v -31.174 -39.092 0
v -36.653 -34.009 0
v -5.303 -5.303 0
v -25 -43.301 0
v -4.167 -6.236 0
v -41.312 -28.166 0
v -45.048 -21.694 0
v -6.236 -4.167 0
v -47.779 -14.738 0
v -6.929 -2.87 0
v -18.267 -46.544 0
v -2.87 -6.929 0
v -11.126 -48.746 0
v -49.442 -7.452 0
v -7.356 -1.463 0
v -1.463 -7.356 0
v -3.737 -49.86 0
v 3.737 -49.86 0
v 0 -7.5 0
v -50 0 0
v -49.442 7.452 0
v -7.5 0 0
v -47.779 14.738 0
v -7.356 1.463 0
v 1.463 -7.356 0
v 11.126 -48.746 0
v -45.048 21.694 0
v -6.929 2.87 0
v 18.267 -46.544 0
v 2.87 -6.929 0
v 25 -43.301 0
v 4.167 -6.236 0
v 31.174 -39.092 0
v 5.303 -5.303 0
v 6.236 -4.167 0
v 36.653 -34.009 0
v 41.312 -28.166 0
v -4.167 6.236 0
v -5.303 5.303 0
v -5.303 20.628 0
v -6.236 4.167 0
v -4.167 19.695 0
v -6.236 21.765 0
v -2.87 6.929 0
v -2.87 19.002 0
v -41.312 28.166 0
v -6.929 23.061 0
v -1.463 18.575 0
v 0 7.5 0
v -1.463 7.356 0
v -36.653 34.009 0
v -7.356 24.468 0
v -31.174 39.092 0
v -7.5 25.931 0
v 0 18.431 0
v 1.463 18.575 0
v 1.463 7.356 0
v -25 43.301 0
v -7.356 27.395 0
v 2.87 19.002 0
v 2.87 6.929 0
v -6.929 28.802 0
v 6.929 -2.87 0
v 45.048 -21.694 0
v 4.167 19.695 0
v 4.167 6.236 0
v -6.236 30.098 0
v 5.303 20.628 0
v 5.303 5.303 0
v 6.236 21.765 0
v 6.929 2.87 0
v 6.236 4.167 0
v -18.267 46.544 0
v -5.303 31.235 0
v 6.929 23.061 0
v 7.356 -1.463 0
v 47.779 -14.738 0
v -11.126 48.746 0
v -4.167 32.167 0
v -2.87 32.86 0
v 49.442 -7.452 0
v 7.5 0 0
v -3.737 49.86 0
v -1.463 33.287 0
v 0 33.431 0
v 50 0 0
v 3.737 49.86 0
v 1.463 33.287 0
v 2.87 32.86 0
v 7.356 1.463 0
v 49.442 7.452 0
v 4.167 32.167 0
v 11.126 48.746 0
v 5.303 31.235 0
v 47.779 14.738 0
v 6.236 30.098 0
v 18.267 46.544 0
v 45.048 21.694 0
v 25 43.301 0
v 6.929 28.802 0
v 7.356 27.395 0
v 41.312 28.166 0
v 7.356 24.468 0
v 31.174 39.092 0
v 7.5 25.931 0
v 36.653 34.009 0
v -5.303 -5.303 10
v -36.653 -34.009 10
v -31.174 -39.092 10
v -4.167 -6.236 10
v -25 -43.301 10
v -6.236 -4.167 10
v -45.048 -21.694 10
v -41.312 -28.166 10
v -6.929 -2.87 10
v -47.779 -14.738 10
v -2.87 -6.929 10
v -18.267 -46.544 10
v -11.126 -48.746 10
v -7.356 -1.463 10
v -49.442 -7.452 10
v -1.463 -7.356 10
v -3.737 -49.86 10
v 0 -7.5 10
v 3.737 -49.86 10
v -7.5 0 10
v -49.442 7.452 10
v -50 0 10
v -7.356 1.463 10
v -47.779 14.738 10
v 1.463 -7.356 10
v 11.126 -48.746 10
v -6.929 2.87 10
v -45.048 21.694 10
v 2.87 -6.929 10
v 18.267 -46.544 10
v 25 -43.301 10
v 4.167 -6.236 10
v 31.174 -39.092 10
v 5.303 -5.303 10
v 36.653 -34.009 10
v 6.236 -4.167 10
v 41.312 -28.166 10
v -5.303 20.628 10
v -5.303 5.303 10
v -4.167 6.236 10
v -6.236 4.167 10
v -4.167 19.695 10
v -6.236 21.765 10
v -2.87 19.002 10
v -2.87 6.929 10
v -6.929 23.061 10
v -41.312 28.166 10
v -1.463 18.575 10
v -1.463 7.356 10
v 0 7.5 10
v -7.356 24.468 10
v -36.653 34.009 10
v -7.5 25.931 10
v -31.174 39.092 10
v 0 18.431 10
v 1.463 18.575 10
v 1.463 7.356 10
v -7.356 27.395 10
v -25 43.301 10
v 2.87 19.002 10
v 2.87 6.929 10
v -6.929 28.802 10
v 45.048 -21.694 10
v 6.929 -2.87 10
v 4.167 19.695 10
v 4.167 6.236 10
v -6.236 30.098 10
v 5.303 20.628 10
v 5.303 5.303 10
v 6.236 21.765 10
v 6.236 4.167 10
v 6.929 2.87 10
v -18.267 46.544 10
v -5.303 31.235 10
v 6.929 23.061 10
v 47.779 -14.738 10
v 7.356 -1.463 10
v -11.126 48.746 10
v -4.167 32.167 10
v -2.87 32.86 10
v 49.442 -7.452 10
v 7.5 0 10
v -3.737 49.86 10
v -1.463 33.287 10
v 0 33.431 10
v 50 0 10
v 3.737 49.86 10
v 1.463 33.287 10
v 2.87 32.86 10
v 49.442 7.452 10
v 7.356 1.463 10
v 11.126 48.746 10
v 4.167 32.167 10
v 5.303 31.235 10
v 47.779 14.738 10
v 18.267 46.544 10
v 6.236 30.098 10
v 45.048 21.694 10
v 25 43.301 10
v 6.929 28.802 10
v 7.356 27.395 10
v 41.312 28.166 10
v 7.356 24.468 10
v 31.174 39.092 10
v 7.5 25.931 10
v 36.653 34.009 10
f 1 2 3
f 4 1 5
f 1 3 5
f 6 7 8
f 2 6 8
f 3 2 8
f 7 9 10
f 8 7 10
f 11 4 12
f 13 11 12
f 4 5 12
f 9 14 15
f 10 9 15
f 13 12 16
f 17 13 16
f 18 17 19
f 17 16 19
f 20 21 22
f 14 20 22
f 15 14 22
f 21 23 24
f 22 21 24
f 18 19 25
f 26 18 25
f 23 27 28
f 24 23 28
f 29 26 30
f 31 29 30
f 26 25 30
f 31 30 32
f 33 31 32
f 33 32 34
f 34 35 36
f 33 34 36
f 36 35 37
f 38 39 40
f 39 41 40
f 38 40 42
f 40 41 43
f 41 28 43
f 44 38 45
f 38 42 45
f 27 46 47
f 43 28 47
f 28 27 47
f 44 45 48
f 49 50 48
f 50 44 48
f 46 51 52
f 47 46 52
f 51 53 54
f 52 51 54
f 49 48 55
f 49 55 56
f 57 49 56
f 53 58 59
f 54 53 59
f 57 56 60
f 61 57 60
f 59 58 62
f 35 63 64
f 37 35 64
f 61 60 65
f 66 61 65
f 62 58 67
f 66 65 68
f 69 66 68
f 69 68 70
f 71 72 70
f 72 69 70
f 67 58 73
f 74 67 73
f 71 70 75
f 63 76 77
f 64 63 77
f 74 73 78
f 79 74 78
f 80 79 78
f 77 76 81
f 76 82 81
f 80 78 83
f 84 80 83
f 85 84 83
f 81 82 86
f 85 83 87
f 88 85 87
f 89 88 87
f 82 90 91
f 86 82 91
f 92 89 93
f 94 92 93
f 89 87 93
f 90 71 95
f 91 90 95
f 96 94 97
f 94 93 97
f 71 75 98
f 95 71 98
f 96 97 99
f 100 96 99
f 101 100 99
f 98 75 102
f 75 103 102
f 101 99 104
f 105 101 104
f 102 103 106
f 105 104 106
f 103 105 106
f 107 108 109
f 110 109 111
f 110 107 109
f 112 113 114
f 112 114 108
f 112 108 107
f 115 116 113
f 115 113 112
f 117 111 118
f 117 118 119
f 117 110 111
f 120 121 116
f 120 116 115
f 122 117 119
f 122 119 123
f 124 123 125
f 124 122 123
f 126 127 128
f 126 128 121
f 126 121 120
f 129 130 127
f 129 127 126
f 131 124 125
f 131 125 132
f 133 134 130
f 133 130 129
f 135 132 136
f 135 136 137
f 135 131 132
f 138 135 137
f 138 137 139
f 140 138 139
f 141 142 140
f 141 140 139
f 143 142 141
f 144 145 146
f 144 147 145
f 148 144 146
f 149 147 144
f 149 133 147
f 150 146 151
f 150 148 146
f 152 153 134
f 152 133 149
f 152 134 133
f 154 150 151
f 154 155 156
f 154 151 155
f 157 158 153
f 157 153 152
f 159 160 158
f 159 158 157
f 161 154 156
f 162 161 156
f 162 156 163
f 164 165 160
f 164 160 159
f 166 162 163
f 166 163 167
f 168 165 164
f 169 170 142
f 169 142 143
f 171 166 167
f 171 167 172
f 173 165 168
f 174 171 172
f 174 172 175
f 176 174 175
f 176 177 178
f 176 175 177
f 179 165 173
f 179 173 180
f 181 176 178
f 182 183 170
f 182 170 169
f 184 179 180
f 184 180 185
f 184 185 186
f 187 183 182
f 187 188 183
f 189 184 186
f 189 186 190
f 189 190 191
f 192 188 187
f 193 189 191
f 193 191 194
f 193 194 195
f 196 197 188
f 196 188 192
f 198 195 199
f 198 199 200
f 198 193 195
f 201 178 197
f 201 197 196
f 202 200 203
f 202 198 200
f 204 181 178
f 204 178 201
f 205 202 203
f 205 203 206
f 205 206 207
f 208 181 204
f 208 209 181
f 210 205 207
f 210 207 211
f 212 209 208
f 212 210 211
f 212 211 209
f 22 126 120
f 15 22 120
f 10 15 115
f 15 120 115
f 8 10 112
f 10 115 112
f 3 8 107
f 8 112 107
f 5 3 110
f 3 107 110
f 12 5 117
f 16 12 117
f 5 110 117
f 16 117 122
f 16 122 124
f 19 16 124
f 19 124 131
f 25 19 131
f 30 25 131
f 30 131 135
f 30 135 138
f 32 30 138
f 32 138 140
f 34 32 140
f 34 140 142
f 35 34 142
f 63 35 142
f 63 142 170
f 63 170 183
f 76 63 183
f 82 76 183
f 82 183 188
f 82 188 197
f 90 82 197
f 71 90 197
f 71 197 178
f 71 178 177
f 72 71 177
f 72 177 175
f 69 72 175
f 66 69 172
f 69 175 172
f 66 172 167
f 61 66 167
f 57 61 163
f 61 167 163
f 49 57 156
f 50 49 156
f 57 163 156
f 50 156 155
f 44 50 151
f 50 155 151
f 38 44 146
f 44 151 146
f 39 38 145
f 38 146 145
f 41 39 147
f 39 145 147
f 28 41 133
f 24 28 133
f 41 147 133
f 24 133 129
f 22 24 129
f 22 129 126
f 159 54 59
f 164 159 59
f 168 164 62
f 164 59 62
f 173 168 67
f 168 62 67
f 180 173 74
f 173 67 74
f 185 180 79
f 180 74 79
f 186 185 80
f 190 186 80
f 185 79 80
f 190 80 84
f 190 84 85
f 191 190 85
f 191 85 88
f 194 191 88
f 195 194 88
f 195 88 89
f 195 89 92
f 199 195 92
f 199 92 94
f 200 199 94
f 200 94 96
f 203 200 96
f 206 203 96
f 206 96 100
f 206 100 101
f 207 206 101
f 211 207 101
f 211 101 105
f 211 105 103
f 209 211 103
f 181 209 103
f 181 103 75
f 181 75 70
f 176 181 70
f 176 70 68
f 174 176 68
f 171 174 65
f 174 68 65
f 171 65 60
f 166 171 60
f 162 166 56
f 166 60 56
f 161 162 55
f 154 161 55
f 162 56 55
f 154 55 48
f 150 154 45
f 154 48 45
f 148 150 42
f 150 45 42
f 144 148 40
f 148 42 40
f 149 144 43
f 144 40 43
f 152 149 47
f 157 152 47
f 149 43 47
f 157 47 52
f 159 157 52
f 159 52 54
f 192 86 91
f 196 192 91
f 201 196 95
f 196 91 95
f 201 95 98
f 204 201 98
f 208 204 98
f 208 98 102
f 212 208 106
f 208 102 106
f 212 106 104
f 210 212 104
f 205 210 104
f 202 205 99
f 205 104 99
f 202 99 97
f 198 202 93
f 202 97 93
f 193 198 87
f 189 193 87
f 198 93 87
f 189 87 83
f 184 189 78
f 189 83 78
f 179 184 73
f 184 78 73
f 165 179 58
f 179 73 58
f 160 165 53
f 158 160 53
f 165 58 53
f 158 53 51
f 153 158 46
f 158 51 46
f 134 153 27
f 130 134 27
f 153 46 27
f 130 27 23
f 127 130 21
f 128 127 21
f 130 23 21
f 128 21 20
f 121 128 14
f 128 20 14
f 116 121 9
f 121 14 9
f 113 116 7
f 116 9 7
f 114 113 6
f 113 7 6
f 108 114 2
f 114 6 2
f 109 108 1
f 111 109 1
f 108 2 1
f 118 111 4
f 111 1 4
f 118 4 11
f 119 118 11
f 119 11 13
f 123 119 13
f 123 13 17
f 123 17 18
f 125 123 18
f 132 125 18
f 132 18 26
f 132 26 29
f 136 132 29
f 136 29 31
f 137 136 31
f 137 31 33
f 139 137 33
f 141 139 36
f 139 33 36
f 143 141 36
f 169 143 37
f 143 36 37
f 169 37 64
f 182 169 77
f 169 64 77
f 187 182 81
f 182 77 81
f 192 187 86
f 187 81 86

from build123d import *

# Parameters (mm, degrees)
F0_R     = 50
F2_DEPTH = 10
F4_D     = 15
F6_D     = 15


with BuildPart() as f2:
    # F0 (on Top) → F2 (new body)
    with BuildSketch(Plane.XY):
        Circle(F0_R)
    extrude(amount=F2_DEPTH)

    # F4 (through all)
    with Locations(Plane.XY.offset(10)):
        with Locations((0, 25.931375)):
            Hole(F4_D / 2)

    # F6 (through all)
    with Locations(Plane(origin=(0, 0, 0), x_dir=(1, 0, 0), z_dir=(0, 0, -1))):
        with Locations((0, 0)):
            Hole(F6_D / 2)


solid = f2.part
